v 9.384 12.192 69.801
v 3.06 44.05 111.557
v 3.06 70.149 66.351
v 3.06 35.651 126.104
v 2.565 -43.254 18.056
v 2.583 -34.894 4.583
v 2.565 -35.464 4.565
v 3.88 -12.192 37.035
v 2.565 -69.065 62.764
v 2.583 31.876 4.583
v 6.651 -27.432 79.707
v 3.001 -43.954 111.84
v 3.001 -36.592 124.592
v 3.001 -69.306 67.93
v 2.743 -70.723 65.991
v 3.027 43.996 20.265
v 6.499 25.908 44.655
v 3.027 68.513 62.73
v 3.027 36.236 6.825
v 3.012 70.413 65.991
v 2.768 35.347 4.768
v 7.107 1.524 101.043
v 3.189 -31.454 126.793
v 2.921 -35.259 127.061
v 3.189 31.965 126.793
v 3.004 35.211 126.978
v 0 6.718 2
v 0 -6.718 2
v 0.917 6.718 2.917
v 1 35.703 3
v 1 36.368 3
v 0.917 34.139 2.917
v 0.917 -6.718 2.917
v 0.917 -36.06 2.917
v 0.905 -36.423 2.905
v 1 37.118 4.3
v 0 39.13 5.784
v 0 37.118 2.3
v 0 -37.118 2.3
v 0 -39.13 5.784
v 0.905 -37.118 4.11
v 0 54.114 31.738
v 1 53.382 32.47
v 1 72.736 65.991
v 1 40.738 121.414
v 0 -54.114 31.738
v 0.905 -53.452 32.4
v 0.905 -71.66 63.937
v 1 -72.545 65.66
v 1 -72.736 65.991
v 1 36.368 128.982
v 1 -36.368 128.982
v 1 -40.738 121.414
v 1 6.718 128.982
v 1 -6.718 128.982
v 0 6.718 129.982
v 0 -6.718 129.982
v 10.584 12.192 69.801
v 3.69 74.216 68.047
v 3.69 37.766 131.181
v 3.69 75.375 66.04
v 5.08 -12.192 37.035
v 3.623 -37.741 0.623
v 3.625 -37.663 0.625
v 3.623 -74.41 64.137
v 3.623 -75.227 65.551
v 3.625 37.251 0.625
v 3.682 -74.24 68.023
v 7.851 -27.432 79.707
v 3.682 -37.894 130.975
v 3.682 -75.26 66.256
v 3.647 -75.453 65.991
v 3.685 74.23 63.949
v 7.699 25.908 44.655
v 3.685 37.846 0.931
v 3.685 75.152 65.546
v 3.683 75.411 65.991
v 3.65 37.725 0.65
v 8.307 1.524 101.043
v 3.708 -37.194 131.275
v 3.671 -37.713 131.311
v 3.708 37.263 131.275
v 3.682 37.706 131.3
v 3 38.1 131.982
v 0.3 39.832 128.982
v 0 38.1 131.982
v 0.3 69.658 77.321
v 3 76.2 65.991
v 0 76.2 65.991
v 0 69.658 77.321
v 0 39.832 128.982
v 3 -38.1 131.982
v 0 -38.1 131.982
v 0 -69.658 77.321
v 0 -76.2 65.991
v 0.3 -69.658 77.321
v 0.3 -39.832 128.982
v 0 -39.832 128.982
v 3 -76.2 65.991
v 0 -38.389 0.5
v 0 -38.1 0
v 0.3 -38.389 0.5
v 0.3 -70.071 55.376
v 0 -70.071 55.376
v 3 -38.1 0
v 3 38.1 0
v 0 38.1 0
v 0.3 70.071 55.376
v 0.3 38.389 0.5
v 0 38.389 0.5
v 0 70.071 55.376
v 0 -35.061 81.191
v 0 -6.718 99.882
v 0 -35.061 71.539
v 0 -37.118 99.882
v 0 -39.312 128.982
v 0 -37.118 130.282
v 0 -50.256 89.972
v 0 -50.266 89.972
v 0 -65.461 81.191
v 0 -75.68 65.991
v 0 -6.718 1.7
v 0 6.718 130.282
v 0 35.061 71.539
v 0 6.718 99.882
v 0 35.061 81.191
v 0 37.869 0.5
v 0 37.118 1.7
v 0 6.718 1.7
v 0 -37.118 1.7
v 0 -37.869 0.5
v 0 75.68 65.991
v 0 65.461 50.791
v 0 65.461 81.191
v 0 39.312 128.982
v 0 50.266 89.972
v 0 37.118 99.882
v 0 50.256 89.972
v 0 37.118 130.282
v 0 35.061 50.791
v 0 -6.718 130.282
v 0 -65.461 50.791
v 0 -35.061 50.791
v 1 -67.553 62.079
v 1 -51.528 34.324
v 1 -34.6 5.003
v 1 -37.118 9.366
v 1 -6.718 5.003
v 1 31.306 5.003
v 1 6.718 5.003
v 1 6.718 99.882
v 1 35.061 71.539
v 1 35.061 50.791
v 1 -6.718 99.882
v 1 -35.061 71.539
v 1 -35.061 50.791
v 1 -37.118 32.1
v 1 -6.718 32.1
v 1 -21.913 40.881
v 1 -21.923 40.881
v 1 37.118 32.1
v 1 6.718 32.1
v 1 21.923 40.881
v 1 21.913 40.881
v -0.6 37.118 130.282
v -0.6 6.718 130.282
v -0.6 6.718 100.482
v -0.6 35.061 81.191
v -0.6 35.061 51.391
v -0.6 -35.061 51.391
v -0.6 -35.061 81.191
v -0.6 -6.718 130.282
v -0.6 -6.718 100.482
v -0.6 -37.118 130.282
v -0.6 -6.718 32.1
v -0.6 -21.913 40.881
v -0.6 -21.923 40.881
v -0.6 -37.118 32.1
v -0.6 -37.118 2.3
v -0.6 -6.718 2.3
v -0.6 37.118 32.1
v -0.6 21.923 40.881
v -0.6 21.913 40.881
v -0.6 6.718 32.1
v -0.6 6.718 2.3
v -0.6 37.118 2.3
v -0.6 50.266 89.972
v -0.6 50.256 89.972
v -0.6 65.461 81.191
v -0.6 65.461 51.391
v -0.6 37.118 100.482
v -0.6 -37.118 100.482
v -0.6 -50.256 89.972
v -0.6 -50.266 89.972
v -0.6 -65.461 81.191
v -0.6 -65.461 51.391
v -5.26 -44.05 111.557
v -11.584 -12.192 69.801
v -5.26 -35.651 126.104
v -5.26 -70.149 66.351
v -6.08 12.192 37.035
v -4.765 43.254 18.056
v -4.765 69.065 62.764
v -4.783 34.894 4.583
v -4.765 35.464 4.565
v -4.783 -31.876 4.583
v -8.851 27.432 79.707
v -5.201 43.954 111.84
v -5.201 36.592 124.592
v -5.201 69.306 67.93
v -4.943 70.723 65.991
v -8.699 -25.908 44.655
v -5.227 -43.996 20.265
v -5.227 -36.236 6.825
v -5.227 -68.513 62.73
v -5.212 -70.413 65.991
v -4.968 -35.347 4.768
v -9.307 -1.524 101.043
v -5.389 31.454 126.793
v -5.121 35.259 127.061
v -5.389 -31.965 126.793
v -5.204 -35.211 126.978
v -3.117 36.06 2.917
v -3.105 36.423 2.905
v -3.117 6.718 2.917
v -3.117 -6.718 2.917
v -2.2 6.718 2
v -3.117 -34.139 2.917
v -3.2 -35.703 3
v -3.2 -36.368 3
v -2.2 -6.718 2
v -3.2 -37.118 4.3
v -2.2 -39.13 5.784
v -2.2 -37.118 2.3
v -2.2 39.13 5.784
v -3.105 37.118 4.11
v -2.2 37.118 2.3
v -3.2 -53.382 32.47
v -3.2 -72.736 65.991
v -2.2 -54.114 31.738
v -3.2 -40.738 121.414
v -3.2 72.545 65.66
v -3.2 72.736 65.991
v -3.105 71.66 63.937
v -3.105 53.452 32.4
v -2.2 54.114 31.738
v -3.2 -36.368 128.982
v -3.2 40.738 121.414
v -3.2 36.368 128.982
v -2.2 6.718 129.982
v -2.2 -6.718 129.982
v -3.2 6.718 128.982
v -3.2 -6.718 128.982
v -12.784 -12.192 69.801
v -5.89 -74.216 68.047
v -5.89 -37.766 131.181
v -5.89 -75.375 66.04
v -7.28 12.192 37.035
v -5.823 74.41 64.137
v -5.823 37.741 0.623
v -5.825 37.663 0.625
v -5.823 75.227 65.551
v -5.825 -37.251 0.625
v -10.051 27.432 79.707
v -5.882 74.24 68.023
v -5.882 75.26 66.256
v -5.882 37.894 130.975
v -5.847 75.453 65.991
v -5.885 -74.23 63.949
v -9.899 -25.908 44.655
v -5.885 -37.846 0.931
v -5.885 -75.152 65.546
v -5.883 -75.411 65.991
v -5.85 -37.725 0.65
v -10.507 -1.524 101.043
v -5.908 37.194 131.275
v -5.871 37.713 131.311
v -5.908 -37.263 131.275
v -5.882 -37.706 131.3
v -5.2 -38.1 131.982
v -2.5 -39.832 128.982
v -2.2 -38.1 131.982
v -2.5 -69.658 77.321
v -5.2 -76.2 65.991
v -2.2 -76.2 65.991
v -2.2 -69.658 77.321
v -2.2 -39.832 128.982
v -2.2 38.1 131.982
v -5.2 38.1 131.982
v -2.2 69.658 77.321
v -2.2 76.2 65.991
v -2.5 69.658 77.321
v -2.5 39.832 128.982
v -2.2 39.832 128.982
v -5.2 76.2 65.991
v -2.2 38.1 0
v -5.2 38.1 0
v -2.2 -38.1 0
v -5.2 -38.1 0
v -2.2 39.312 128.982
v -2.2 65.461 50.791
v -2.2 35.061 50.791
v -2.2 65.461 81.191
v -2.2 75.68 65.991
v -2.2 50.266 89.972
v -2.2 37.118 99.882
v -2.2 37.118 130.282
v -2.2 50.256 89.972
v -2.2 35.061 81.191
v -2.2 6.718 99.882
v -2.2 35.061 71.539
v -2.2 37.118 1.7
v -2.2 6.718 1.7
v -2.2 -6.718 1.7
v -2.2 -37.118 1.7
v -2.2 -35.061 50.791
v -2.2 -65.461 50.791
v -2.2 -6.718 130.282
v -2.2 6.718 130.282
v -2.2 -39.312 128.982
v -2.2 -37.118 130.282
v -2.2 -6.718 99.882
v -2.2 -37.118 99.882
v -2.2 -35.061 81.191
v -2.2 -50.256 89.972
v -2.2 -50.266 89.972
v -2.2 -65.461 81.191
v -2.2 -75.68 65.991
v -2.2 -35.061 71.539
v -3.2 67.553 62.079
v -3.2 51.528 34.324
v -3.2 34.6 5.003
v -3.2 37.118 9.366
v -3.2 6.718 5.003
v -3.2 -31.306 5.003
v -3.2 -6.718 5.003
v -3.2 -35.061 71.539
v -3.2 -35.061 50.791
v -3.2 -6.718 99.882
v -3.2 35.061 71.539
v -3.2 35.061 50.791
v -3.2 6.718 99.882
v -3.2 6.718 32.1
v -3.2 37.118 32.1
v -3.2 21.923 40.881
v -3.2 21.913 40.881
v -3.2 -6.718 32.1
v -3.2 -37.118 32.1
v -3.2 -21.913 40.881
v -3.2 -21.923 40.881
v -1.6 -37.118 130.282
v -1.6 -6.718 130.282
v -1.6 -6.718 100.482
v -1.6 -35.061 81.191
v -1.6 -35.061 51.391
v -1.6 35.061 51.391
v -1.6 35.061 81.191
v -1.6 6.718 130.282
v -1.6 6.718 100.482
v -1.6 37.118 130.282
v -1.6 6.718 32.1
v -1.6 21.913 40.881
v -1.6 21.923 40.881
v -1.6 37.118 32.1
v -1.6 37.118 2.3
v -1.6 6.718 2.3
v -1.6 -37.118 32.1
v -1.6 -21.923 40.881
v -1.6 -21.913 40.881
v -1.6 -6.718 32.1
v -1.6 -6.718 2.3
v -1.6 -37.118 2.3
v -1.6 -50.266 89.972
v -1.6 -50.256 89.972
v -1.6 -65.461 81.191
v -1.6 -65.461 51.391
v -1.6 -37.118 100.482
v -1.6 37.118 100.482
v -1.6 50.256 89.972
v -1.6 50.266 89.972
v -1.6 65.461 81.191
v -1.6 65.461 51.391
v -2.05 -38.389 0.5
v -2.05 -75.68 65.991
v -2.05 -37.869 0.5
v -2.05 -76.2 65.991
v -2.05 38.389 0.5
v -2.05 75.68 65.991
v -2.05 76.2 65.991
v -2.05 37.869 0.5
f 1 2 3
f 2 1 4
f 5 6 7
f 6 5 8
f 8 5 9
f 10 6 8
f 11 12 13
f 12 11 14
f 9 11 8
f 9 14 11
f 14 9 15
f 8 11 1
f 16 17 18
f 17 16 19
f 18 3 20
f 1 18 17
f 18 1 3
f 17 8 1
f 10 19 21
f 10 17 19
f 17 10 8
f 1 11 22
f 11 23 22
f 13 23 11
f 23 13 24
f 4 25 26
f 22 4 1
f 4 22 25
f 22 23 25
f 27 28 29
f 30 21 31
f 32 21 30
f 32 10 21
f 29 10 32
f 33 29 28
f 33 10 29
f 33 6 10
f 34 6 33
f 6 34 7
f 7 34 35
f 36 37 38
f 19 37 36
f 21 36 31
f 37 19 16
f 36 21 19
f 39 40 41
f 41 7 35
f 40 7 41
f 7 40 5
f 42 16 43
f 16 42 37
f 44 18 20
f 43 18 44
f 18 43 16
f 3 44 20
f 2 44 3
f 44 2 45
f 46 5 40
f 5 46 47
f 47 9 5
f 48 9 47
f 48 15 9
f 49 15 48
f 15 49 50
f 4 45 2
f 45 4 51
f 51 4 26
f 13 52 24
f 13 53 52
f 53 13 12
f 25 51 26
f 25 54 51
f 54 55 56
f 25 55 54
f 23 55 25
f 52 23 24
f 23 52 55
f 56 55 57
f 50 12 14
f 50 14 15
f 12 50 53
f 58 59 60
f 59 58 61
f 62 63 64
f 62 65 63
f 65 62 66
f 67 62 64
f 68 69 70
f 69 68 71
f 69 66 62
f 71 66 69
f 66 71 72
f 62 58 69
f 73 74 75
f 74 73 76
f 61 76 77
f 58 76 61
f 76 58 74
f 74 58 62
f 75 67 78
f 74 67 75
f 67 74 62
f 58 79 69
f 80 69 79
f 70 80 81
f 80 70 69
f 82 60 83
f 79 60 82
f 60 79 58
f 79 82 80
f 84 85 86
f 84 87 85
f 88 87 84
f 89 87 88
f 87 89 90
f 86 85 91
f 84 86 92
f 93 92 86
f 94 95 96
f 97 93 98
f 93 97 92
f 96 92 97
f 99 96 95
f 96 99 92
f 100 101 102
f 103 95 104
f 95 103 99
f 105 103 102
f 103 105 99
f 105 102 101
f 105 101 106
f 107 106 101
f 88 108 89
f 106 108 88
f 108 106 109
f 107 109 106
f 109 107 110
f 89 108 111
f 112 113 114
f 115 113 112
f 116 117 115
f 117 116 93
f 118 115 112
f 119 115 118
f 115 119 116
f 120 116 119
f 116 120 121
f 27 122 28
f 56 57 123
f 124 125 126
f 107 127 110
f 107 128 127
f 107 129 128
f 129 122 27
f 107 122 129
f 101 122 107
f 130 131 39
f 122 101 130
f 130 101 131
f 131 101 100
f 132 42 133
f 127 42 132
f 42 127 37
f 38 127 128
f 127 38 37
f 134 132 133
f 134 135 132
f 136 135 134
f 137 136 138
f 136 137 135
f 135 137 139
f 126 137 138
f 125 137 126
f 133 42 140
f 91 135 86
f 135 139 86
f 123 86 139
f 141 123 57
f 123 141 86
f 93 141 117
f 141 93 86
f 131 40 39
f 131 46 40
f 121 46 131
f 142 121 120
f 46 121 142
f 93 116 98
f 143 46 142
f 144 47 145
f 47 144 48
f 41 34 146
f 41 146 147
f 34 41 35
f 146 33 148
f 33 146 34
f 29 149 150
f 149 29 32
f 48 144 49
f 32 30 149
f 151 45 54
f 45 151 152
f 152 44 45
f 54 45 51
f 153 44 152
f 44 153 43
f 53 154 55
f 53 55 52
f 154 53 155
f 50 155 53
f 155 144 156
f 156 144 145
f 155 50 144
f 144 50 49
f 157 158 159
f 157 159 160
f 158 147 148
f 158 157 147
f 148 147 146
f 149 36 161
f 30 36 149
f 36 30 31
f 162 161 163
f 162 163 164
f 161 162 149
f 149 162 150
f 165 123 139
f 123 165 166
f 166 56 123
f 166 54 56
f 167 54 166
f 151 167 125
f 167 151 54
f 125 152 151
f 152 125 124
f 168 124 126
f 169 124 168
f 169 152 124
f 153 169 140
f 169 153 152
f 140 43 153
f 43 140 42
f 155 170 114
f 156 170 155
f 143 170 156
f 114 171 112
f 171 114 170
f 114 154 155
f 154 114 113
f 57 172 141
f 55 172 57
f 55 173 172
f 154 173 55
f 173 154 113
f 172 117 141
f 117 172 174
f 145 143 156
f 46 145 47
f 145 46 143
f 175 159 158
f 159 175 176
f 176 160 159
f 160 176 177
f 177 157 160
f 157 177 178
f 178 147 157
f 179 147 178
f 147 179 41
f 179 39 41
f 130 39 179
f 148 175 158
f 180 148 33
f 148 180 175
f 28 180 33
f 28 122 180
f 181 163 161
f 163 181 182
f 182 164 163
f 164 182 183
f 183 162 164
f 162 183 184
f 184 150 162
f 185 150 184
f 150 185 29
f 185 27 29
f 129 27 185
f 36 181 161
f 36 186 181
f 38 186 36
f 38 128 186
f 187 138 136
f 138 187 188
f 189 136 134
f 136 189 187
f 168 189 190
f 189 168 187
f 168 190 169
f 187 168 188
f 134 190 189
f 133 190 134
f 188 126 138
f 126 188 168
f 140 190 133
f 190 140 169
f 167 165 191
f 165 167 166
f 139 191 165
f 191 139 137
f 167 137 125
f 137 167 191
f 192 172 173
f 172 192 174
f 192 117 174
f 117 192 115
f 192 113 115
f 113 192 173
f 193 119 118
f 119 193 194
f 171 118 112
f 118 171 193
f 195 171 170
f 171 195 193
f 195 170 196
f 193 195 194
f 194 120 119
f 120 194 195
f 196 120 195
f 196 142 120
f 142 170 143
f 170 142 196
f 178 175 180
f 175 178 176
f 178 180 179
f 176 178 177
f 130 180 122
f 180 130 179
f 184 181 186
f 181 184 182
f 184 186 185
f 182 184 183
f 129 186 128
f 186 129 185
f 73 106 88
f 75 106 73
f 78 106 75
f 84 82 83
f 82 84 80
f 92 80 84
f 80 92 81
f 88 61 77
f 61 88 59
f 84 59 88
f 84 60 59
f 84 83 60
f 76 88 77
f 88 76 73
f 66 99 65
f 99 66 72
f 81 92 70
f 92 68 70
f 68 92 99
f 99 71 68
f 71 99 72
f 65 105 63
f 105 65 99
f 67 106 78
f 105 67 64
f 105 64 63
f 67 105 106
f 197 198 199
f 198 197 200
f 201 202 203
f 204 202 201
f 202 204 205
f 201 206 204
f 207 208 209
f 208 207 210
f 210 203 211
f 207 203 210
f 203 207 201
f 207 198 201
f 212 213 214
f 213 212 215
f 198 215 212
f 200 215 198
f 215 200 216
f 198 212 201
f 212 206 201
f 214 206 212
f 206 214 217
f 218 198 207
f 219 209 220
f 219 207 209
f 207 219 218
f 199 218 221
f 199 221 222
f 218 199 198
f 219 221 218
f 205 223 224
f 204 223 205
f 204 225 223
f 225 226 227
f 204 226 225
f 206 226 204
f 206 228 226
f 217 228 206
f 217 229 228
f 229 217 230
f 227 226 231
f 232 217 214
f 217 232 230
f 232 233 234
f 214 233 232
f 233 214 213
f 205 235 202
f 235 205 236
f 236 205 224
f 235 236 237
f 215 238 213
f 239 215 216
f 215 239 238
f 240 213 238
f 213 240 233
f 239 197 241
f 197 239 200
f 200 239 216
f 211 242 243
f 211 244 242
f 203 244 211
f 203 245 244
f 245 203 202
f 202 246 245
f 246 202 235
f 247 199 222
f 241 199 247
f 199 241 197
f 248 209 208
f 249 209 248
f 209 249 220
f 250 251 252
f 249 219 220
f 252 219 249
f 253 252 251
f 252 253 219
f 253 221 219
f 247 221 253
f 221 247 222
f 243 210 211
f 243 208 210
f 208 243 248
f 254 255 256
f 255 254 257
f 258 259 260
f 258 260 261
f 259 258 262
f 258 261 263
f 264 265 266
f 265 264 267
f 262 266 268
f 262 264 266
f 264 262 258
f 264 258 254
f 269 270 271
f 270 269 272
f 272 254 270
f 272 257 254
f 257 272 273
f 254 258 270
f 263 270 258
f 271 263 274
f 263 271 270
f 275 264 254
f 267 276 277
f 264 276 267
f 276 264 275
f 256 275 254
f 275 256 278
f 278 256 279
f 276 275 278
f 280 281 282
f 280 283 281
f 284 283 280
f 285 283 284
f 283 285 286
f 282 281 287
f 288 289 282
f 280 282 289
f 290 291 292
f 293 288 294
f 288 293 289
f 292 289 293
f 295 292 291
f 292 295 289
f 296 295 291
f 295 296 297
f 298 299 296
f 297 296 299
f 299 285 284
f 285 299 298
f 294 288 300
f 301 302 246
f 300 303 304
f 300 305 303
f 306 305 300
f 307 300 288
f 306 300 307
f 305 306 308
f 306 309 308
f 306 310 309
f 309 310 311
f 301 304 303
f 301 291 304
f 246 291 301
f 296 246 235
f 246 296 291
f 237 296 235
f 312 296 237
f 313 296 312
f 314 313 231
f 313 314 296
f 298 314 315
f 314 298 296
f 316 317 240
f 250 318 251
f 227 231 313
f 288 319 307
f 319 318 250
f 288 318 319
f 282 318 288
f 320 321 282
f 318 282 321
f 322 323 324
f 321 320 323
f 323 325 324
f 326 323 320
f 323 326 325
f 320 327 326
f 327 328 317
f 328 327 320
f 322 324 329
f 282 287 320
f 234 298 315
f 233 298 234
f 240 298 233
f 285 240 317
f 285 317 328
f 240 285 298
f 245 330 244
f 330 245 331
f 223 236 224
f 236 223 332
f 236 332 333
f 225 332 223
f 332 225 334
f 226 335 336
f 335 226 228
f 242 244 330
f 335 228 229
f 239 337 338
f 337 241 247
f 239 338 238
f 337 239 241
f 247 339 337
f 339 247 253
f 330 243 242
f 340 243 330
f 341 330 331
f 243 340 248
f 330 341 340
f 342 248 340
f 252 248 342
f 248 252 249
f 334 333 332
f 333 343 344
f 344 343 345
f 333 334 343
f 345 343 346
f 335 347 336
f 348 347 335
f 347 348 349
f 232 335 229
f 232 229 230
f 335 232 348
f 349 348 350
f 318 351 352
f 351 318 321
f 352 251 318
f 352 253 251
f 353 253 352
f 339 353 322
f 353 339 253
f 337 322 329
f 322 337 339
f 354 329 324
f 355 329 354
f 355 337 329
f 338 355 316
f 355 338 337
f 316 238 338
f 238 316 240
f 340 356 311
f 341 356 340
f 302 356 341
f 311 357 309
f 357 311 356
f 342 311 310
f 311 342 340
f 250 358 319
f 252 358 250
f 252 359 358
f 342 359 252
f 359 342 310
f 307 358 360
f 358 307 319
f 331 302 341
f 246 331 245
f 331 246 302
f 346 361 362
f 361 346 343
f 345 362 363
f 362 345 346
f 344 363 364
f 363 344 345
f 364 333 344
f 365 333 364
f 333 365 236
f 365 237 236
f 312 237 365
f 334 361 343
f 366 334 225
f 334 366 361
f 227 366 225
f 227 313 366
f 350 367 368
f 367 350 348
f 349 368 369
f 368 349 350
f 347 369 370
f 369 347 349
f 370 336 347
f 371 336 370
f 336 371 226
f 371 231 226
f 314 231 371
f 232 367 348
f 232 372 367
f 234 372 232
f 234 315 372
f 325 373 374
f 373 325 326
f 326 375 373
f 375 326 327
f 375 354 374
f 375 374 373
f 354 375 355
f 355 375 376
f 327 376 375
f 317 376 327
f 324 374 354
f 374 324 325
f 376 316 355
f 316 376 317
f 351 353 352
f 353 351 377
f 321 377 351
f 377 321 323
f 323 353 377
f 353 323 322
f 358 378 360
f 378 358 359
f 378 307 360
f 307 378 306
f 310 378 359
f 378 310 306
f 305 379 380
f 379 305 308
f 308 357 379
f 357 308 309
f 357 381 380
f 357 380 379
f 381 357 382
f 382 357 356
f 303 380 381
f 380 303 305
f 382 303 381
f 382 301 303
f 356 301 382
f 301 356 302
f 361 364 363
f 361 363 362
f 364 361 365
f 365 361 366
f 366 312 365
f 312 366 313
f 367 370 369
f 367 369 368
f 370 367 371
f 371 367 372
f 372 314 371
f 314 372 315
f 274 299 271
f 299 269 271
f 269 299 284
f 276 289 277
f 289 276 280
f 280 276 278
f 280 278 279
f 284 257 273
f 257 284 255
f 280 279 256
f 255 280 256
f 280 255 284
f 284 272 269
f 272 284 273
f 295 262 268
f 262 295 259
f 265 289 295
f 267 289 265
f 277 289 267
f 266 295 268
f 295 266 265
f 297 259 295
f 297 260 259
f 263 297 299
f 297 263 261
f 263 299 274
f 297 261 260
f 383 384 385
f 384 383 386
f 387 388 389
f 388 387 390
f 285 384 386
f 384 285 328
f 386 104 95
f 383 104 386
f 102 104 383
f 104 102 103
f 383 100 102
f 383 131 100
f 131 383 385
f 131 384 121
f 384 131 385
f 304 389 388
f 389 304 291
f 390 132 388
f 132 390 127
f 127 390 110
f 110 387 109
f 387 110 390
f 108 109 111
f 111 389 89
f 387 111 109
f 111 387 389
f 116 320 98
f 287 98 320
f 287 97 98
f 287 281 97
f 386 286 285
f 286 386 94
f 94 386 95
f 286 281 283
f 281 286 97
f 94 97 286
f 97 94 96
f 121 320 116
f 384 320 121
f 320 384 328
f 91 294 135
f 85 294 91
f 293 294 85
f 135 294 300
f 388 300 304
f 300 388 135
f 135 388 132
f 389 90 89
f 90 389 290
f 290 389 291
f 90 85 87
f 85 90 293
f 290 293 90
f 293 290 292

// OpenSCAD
// Hexagon wall tile v54 — parametric rebuild of v30
// Front: identical low-poly facets to v30 (same facet angles at every size).
// Edge profile: identical on every size (edge depth, rim width) so tiles butt flush.
// Back: six corner pads for 1" (25 mm) double-sided mounting tape.
// v32: tape pads are flat plates hung from the rim with an air gap to the front skin.
// v33: thinner skin + thinner pads so the air gap is 1.4 mm even right at the edges
//      (v32 had only 0.8 mm there and showed marks along the slanted edges).
// v34: snap-off stabilizer fins behind the bottom edge so the tall, thin tile can't tip over
//      while printing. Break them off afterwards (bend sideways) and the back stays flat.
// v35: 0.6 mm 45° chamfer on the front edge (crisp, consistent shadow line between tiles; hides
//      first-layer squish and brim trim marks) + relief_scale to deepen the facets if wanted.
// v37: much smaller breakaway tabs (0.8 x 0.6 mm, every 8 mm) so the fins snap off easily.
// v38: full-height snap-off BRACE FRAME behind the tile: a thin hex ring + X/vertical bars,
//      1 mm behind the back, tied to the tile rim by tiny tabs all the way round (incl. the top).
//      Tile + brace act as a stiff box while printing; the fins now sit on the brace.
//      Peel the brace off after printing — the tabs only touch the back rim.
// v39: PAIR mode (default): two identical tiles printed back-to-back, 0.4 mm apart, so each
//      cradles the other full-height. Only 12 tiny tabs (corners + mid-sides) join the back
//      rims — twist/peel the tiles apart. No brace, no fins, almost no waste. The pair is
//      turned 90° on the bed so the 'back' seam lands on a side edge, not on either face.
// v40: pair tabs spaced evenly every ~pair_tab_pitch mm round the rim on EVERY size. In v39 the
//      tab spacing grew with the tile (3": ~23 mm max gap, 6": ~46 mm, 10": ~79 mm), so the 3" pair
//      printed perfectly but the 6" rims flexed apart between tabs and broke up above mid-height.
//      Now every size has the same tab spacing as a stiff 3" pair (or tighter).
// v42: tabs replaced by one continuous hairline SEAM round the outer edge of the pair gap.
//      Discrete tabs changed the toolpath on every layer that had a tab, leaving a faint line
//      across the tile every ~10 mm of height. With a continuous seam every layer has the same
//      shape, so there is nothing to print differently. Separate the tiles by running a utility
//      knife along the seam line on the edges, then twist apart.
// v43: stiffer tape pads — each pad now grows from the back plane toward the front until it is
//      pad_gap (1.4 mm) from the skin, instead of being a 1 mm plate (the skin stays untouched, so
//      no ghost lines). Larger tiles (>= mid_pad_min_in)
//      get four extra pads at the slanted mid-edges: 10 tape spots on the 10".
// v44: UNIFORM pads. Every pad is the same PAD x PAD tape square, pushed snug into its corner
//      (touching both rims), with only a small 45° gusset beneath it down to the rim so it prints
//      without support. Because a hex corner is the same angle at every size, the 6" and 10" pads
//      are identical in shape and size; the 3" uses the same layout with smaller squares.
//      The 10" adds the same square at the middle of each slanted edge.
// v46: pads are a 1 mm plate with a stiffening LIP round the free edges (like a shallow tray),
//      instead of solid-filled — nearly the stiffness of v44's deep pads at close to v42 print time.
// v47: pair gap 0.4 -> 1.0 mm. At 0.4 mm the squashed back walls of the two tiles touched and
//      fused, so v42-v46 pairs would not come apart. At 1.0 mm only the hairline edge seam joins
//      them: cut it with a utility knife (there is now room for the blade) and they separate.
// v48: seam only on the four SLANTED edges. The top and bottom flat edges are left open (a 1 mm
//      slot), so a putty knife / flat screwdriver can go in and pry the pair open, unzipping the
//      seam. Every layer still crosses the seam at both ends, so the layer shape stays constant.
// v49: "KISS" seam — the seam is printed on ONE tile only and stops seam_kiss short of the other
//      tile's back. The two tiles are never one solid: they only touch where the plastic squashes
//      out, which tacks them lightly (enough to steady them while printing, weak enough to snap by
//      hand). Set seam_kiss = 0 to go back to the fused v48 seam.
// v50: (1) every tape pad gets a 45° pointed top, so pads taper out over many layers instead of
//      ending on one layer. Abrupt pad ends changed the layer time suddenly and left a line across
//      the face (seen at ~14% and ~36% height on the 10").
//      (2) the stiffening lips stay lip_gap (2.5 mm) clear of the skin, not 1.4: near the edges the
//      lips were hugging the skin and ghosting through as ridges parallel to the edge.
// v51: STIFFER, LARGER TAPE PADS without touching the front edge profile:
//      - each tape SQUARE stands pad_proud (1.2 mm) proud of the back rim, so where the tape goes
//        the pad is ~2.2 mm thick (was 1 mm) — roughly 8-10x stiffer. The tile sits on its pads;
//        the rim floats ~1.2 mm + tape thickness off the wall. Support webs stay thin (print time).
//      - pads 30 mm square (fit 1" tape with margin), with a shallow 30° roof instead of a point.
//      - front kept cleaner: pads now stay pad_gap = 1.6 mm from the skin; no lips.
//      - pair gap grows to keep 1 mm between the two tiles' proud pads.
//      - seam now starts right at the bottom corners (no cantilevered start); pry slot along the top.
// v53: seam is FUSED (one printed line) on the two upper slanted edges and stays a light-contact
//      kiss seam on the lower two. The top half is where the pair wobbled (ripples near the top
//      corners); the switch happens at mid-height, where the hex corners already turn.
//      Separate: knife in the top slot, run down both upper edges, twist apart.
// v54: tape squares 0.6 mm proud (was 1.2): ~1.6 mm thick, still ~4x stiffer than v50's 1 mm
//      plates, and about 1 hour less on a 10" pair. Print time goes to the face instead.
// Prints upright on a flat edge with NO supports (every downward edge is 45° or steeper).
//
// Export one size at a time, e.g.:
//   openscad -D size_in=6 -o hex_pair_v54_6in.stl hex_wall_tile_v54.scad

/* [Size] */
size_in       = 6;      // point-to-point width in inches (3, 6, 10 ...)

/* [Edge profile — keep identical across sizes] */
// Space behind the skin at the edge = edge_depth - skin; it must be >= pad_plate + pad_gap + pad_recess.
edge_depth    = 3.6;    // depth of the outer edge, back plane to front face (mm)
rim           = 2.0;    // perimeter wall thickness at the back plane (mm)
front_chamfer = 0.6;    // 45° chamfer on the front edge (mm); 0 = sharp edge

/* [Look] */
relief_scale  = 1.0;    // 1.0 = v30 facets; 1.5 = 50% deeper facets (same edge profile on all sizes)

/* [Front skin] */
skin          = 1.2;    // front skin thickness (mm) — 3 lines at 0.4 mm, same on all sizes

/* [Tape pads] */
tape_width    = 25.4;   // tape width (mm)
pad_margin    = 5;      // extra pad width beyond the tape (mm) -> 30.4 mm pads
pad_max_frac  = 0.45;   // pad never larger than this fraction of the tile radius (keeps 3" usable)
pad_plate     = 1.0;    // pad thickness in front of the back plane (mm), less where the skin is close
pad_proud     = 0.6;    // pads stand this far behind the back rim (mm) -> extra stiffness, no effect on the front
roof_angle    = 30;     // slope of the pad tops (deg) — tapers the pad end over several mm of height
pad_depth     = 0;         // stiffening lip depth (mm); always stops pad_gap from the skin
lip_gap       = 2.5;    // lips stop this far from the skin (plates keep pad_gap)
pad_lip       = 0.9;    // lip thickness (mm) — two lines
mid_pad_min_in = 8;     // tiles this size or larger also get pads at the four slanted mid-edges
pad_gap       = 1.6;    // minimum air gap between pads and the front skin (mm) — keeps the front clean
pad_recess    = 0;      // pads set back from the rim (mm); >0 lets the rim touch the wall,
                        // but near the edges the plate is then trimmed thinner to keep pad_gap

/* [Print stabilizers (snap off after printing)] */
stabilizers   = false;  // v34-v38 option; not needed in pair mode
fin_count     = 2;      // fins behind the bottom edge, placed symmetrically
fin_thick     = 1.6;    // fin thickness (mm)
fin_height_frac = 0.35; // fin height as a fraction of the tile height
fin_depth_frac  = 0.4;  // fin depth behind the brace as a fraction of fin height
fin_depth_min   = 15;   // (mm)
fin_gap       = 0.5;    // air gap between fin and tile back (mm)
tab_height    = 0.6;    // breakaway tab height (mm, vertical when printing) — 3 layers at 0.2
tab_width     = 0.8;    // breakaway tab width (mm), centred on the fin — 2 lines
tab_pitch     = 8;      // spacing between tabs (mm)

/* [Full-height brace frame (snap off after printing)] */
brace         = false;  // v38 option; not needed in pair mode
brace_gap     = 1.0;    // air gap between tile back and brace (mm)
brace_thick   = 1.6;    // brace thickness (mm)
brace_rim_w   = 4;      // width of the brace's hex ring (mm)
brace_bar_w   = 3;      // width of the X and vertical bars (mm)
brace_tab_pitch = 10;   // spacing of brace tabs along each rim side (mm)
brace_tab     = 0.8;    // brace tab size (mm) — tiny, so the brace peels off

/* [Back-to-back pair (default)] */
pair          = true;
pad_clear     = 1.0;    // air between the two tiles' proud pads (mm)
pair_gap      = pad_clear + 2*pad_proud;   // gap between the two back planes (mm)
pair_tab      = 0.6;    // tab size (mm) — tiny, so the pair twists apart
pair_tab_pitch = 12;    // (v40 tabs, unused when pair_seam_w > 0)
pair_seam_w   = 0.45;   // width of the continuous edge seam bridging the gap (mm) — about one line
seam_kiss     = 0.15;   // gap between the seam tip and the other tile (mm); 0 = fused seam
upper_fused   = true;   // v53: fuse the seam on the two upper slanted edges only
seam_open     = 3;      // leave the seam off this far from the top and bottom flat edges (mm) -> pry slots

/* [Output] */
orient_for_print = true; // stand upright on a flat edge, back facing +Y

/* [Hidden] */
R   = size_in * 25.4 / 2;         // corner radius
AP  = R * cos(30);                // apothem
PAD = min(tape_width + pad_margin, R * pad_max_frac);

// Normalised front geometry from v30 (x, y in units of R; z = relief above edge, units of R)
FP = [[1,0,0],[0.5,0.866025,0],[-0.5,0.866025,0],[-1,0,0],[-0.5,-0.866025,0],[0.5,-0.866025,0],
      [0.16,0.05,0.091654],[-0.16,-0.38,0.019428],[-0.36,0.18,0.05579],[0.34,-0.28,0.053795],[0.02,0.46,0.061766]];
FACES = [[0,6,1],[4,3,7],[5,4,7],[8,3,2],[7,3,8],[7,8,6],[5,9,0],[9,6,0],[9,7,6],[5,7,9],
         [6,8,10],[8,2,10],[6,10,1],[10,2,1],
         [1,12,11,0],[2,13,12,1],[3,14,13,2],[4,15,14,3],[5,16,15,4],[0,11,16,5],
         [11,12,13,14,15,16]];
RELIEF_MAX = 0.091654 * R * relief_scale;
D = edge_depth + RELIEF_MAX + 1;  // max depth used for chamfers

// Solid bounded by the faceted front (shifted by dz) and a flat back at z = zb
module body(dz = 0, zb = 0) {
    pts = concat(
        [for (p = FP) [p[0]*R, p[1]*R, edge_depth + p[2]*R*relief_scale + dz]],
        [for (i = [0:5]) [FP[i][0]*R, FP[i][1]*R, zb]]);
    polyhedron(points = pts, faces = FACES, convexity = 4);
}

module hex2d(apothem) { circle(r = apothem / cos(30), $fn = 6); }

// Back cavity: behind the skin, inside the rim; rim inner faces slope 45° so nothing needs support
module cavity(extra = 0) {
    H  = D + 2;
    a0 = AP - rim - extra + 1;             // apothem at z = -1
    intersection() {
        body(dz = -skin - extra, zb = -1);
        translate([0, 0, -1]) linear_extrude(height = H, scale = (a0 - H) / a0) hex2d(a0);
    }
}

// ---- Uniform tape pads ----------------------------------------------------------------
PA = AP - rim + 0.3;                    // inner apothem used for pads (0.3 mm overlap fuses them to the rim)
PH = PAD / 2;
function nrm(a) = [cos(a), sin(a)];
function lim(a) = PA - PH * (abs(cos(a)) + abs(sin(a)));     // max n.c for an axis-aligned PAD square
// centre of a PAD square snug in the corner at angle t (touches the two rims meeting there)
function corner_c(t) = let(n1 = nrm(t - 30), n2 = nrm(t + 30), b1 = lim(t - 30), b2 = lim(t + 30), d = sin(60))
    [(b1*n2[1] - b2*n1[1]) / d, (n1[0]*b2 - n2[0]*b1) / d];
// centre of a PAD square snug against the middle of the edge whose normal is at angle a
function edge_c(a) = lim(a) * nrm(a);
// downward 45° (or vertical) gusset direction toward the nearest rim below — printed upright, model -y is down
function gdir(t) = (cos(t) > 0.1) ? [1, -1] : (cos(t) < -0.1) ? [-1, -1] : [0, -1];

module pad_sq(c, dir) {
    intersection() {
        hex2d(PA);
        hull() {
            translate(c) square(PAD, center = true);
            translate(c + [0, PAD/2 + PAD/2*tan(roof_angle)]) square(0.01, center = true);   // shallow roof
            translate(c + dir * R) square(PAD, center = true);
        }
    }
}
module pad_fp(k)  { t = 60*k;      pad_sq(corner_c(t), (k == 4 || k == 5) ? [0, -1] : gdir(t)); }
module mid_fp(k)  { a = 30 + 60*k; pad_sq(edge_c(a),   (k == 3 || k == 5) ? [0, -1] : gdir(a)); }

module pad_fps() {
    for (k = [0:5]) pad_fp(k);
    if (size_in >= mid_pad_min_in) for (k = [0, 2, 3, 5]) mid_fp(k);
}
// proud part of one tape square: only the square itself (not its support web), with a 45° ramp
// at its lower edge so, printed upright, it grows out of the plate instead of starting as a ledge
module proud_sq(c) {
    intersection() {
        translate([0, 0, -pad_proud]) linear_extrude(pad_proud + 0.01)
            intersection() {
                hex2d(PA);
                hull() { translate(c) square(PAD, center = true);
                         translate(c + [0, PAD/2 + PAD/2*tan(roof_angle)]) square(0.01, center = true); }
            }
        translate([0, c[1] - PAD/2, 0])
            multmatrix([[1,0,0,0],[0,1,-1,0],[0,0,1,0]]) translate([-2*R, 0, -5]) cube([4*R, 4*R, 10]);
    }
}
module pads() {
    intersection() {                                       // tape plate in front of the back plane, pad_gap from the skin
        body(dz = -skin - pad_gap, zb = -1);
        linear_extrude(pad_plate) pad_fps();
    }
    for (k = [0:5]) proud_sq(corner_c(60*k));              // stiff proud tape squares behind it
    if (size_in >= mid_pad_min_in) for (k = [0, 2, 3, 5]) proud_sq(edge_c(30 + 60*k));
}

module chamfer_clip() {
    HB = D + 5;
    union() {
        translate([0, 0, -2]) linear_extrude(edge_depth - front_chamfer + 2) hex2d(AP + 1);
        translate([0, 0, edge_depth - front_chamfer]) linear_extrude(height = HB, scale = (AP - HB) / AP) hex2d(AP);
    }
}

module tile() {
    intersection() {
        union() {
            difference() { body(); cavity(); }
            pads();
        }
        if (front_chamfer > 0) chamfer_clip(); else translate([-2*R, -2*R, -5]) cube([4*R, 4*R, 4*R]);
    }
}

// Triangular fins standing on the bed behind the back (model z < 0), joined to the tile by small tabs
FIN_H = fin_height_frac * 2 * AP;
FIN_L = max(fin_depth_min, fin_depth_frac * FIN_H);
function fin_x(i) = (fin_count == 1) ? 0 : (-1 + 2 * i / (fin_count - 1)) * 0.35 * R;
BZ = brace ? brace_gap + brace_thick : 0;          // fins start behind the brace when it is used
module stabilizer_fins() {
    for (i = [0 : fin_count - 1]) {
        x = fin_x(i);
        fg = brace ? BZ - 0.3 : fin_gap;                // with a brace: fused into it (no tabs needed)
        hull() {                                            // fin: vertical triangle
            translate([x - fin_thick/2, -AP, -fg - FIN_L]) cube([fin_thick, 0.01, FIN_L]);
            translate([x - fin_thick/2, -AP, -fg - 0.01]) cube([fin_thick, FIN_H, 0.01]);
        }
        if (!brace)
            for (y = [0 : tab_pitch : FIN_H - tab_height])  // breakaway tabs into the back plane
                translate([x - tab_width/2, -AP + y, -fin_gap - 0.05]) cube([tab_width, tab_height, fin_gap + 0.35]);
    }
}

// Brace frame (2D, in the tile plane). Printed upright, so every downward-facing edge is >= 45°:
// the top bar is carried by 45° roofs in the two top windows; bars run vertical or at ±60°.
module brace_2d() {
    W  = brace_rim_w;
    Yt = AP - W;                                        // underside of the top ring bar
    difference() {
        hex2d(AP);
        intersection() {                                // the open window, with a 45° roof under the top bar
            hex2d(AP - W);
            // only the two top windows touch the top bar: give them a 45° valley roof
            polygon([[-2*R, -2*R], [2*R, -2*R], [2*R, 2*R], [R/2, 2*R], [R/2, Yt],
                     [0, Yt - R/2], [-R/2, Yt], [-R/2, 2*R], [-2*R, 2*R]]);
        }
    }
    intersection() {
        hex2d(AP);
        union() {
            square([brace_bar_w, 2*AP], center = true);                 // vertical bar
            rotate(60)  square([4*R, brace_bar_w], center = true);      // ±60° diagonals (corner to corner)
            rotate(-60) square([4*R, brace_bar_w], center = true);
        }
    }
}

module brace_frame() {
    translate([0, 0, -BZ]) linear_extrude(brace_thick) brace_2d();
    // tiny tabs across the gap, on the tile's back rim (1 mm in from the outline), all six sides
    for (k = [0:5]) {
        a0 = 60*k; a1 = 60*(k+1);
        p0 = [ (R - 1/sin(60)) * cos(a0), (R - 1/sin(60)) * sin(a0) ];
        p1 = [ (R - 1/sin(60)) * cos(a1), (R - 1/sin(60)) * sin(a1) ];
        L  = norm(p1 - p0);
        n  = floor((L - 6) / brace_tab_pitch);
        for (j = [0 : n]) {
            t = (3 + j * (L - 6) / max(n, 1)) / L;
            p = p0 + t * (p1 - p0);
            translate([p[0], p[1], -brace_gap - 0.3]) rotate(a0 + 120)
                translate([-brace_tab/2, -brace_tab/2, 0]) cube([brace_tab, brace_tab, brace_gap + 0.6]);
        }
    }
}

// Tabs across the pair gap, evenly spaced along each rim side (1 mm in from the outline)
module pair_tabs() {
    rr = R - 1/sin(60);
    n  = max(2, ceil(rr / pair_tab_pitch));          // side length = rr
    for (k = [0:5]) for (i = [0:n-1]) {
        f  = (i + 0.5) / n;
        a0 = 60*k; a1 = 60*(k+1);
        p = [rr*cos(a0), rr*sin(a0)] + f * ([rr*cos(a1), rr*sin(a1)] - [rr*cos(a0), rr*sin(a0)]);
        translate([p[0], p[1], -pair_gap - 0.3]) rotate(a0 + 120)
            translate([-pair_tab/2, -pair_tab/2, 0]) cube([pair_tab, pair_tab, pair_gap + 0.6]);
    }
}
// Continuous hairline seam round the outline, bridging the gap between the two back planes
// Seam strip along the slanted edges, between z0 (partner side) and +0.3 (into this tile)
module seam_strip(z0, ylo, yhi) {
    translate([0, 0, z0]) linear_extrude(0.3 - z0)
        intersection() {
            difference() { hex2d(AP); hex2d(AP - pair_seam_w); }
            translate([-2*R, ylo]) square([4*R, yhi - ylo]);
        }
}
module pair_seam() {
    ybot = -AP + pair_seam_w + 0.05;       // just off the bed (bottom corners)
    ytop =  AP - seam_open;                // top pry slot
    // lower half: light-contact "kiss" seam (stops seam_kiss short of the partner)
    seam_strip((seam_kiss > 0) ? -pair_gap + seam_kiss : -pair_gap - 0.3, ybot, 0);
    // upper half: fused hairline seam (one printed line) — braces the top, where the pair wobbles
    seam_strip(upper_fused ? -pair_gap - 0.3 : -pair_gap + seam_kiss, 0, ytop);
}
module partner() { translate([0, 0, -pair_gap]) rotate([0, 180, 0]) tile(); }   // same tile turned round, not mirrored

module assembly() {
    tile();
    if (pair) { partner(); if (pair_seam_w > 0) pair_seam(); else pair_tabs(); }
    else { if (brace) brace_frame(); if (stabilizers) stabilizer_fins(); }
}

if (orient_for_print)
    rotate([0, 0, pair ? 90 : 0]) translate([0, 0, AP]) rotate([90, 0, 0]) assembly();
else
    assembly();
